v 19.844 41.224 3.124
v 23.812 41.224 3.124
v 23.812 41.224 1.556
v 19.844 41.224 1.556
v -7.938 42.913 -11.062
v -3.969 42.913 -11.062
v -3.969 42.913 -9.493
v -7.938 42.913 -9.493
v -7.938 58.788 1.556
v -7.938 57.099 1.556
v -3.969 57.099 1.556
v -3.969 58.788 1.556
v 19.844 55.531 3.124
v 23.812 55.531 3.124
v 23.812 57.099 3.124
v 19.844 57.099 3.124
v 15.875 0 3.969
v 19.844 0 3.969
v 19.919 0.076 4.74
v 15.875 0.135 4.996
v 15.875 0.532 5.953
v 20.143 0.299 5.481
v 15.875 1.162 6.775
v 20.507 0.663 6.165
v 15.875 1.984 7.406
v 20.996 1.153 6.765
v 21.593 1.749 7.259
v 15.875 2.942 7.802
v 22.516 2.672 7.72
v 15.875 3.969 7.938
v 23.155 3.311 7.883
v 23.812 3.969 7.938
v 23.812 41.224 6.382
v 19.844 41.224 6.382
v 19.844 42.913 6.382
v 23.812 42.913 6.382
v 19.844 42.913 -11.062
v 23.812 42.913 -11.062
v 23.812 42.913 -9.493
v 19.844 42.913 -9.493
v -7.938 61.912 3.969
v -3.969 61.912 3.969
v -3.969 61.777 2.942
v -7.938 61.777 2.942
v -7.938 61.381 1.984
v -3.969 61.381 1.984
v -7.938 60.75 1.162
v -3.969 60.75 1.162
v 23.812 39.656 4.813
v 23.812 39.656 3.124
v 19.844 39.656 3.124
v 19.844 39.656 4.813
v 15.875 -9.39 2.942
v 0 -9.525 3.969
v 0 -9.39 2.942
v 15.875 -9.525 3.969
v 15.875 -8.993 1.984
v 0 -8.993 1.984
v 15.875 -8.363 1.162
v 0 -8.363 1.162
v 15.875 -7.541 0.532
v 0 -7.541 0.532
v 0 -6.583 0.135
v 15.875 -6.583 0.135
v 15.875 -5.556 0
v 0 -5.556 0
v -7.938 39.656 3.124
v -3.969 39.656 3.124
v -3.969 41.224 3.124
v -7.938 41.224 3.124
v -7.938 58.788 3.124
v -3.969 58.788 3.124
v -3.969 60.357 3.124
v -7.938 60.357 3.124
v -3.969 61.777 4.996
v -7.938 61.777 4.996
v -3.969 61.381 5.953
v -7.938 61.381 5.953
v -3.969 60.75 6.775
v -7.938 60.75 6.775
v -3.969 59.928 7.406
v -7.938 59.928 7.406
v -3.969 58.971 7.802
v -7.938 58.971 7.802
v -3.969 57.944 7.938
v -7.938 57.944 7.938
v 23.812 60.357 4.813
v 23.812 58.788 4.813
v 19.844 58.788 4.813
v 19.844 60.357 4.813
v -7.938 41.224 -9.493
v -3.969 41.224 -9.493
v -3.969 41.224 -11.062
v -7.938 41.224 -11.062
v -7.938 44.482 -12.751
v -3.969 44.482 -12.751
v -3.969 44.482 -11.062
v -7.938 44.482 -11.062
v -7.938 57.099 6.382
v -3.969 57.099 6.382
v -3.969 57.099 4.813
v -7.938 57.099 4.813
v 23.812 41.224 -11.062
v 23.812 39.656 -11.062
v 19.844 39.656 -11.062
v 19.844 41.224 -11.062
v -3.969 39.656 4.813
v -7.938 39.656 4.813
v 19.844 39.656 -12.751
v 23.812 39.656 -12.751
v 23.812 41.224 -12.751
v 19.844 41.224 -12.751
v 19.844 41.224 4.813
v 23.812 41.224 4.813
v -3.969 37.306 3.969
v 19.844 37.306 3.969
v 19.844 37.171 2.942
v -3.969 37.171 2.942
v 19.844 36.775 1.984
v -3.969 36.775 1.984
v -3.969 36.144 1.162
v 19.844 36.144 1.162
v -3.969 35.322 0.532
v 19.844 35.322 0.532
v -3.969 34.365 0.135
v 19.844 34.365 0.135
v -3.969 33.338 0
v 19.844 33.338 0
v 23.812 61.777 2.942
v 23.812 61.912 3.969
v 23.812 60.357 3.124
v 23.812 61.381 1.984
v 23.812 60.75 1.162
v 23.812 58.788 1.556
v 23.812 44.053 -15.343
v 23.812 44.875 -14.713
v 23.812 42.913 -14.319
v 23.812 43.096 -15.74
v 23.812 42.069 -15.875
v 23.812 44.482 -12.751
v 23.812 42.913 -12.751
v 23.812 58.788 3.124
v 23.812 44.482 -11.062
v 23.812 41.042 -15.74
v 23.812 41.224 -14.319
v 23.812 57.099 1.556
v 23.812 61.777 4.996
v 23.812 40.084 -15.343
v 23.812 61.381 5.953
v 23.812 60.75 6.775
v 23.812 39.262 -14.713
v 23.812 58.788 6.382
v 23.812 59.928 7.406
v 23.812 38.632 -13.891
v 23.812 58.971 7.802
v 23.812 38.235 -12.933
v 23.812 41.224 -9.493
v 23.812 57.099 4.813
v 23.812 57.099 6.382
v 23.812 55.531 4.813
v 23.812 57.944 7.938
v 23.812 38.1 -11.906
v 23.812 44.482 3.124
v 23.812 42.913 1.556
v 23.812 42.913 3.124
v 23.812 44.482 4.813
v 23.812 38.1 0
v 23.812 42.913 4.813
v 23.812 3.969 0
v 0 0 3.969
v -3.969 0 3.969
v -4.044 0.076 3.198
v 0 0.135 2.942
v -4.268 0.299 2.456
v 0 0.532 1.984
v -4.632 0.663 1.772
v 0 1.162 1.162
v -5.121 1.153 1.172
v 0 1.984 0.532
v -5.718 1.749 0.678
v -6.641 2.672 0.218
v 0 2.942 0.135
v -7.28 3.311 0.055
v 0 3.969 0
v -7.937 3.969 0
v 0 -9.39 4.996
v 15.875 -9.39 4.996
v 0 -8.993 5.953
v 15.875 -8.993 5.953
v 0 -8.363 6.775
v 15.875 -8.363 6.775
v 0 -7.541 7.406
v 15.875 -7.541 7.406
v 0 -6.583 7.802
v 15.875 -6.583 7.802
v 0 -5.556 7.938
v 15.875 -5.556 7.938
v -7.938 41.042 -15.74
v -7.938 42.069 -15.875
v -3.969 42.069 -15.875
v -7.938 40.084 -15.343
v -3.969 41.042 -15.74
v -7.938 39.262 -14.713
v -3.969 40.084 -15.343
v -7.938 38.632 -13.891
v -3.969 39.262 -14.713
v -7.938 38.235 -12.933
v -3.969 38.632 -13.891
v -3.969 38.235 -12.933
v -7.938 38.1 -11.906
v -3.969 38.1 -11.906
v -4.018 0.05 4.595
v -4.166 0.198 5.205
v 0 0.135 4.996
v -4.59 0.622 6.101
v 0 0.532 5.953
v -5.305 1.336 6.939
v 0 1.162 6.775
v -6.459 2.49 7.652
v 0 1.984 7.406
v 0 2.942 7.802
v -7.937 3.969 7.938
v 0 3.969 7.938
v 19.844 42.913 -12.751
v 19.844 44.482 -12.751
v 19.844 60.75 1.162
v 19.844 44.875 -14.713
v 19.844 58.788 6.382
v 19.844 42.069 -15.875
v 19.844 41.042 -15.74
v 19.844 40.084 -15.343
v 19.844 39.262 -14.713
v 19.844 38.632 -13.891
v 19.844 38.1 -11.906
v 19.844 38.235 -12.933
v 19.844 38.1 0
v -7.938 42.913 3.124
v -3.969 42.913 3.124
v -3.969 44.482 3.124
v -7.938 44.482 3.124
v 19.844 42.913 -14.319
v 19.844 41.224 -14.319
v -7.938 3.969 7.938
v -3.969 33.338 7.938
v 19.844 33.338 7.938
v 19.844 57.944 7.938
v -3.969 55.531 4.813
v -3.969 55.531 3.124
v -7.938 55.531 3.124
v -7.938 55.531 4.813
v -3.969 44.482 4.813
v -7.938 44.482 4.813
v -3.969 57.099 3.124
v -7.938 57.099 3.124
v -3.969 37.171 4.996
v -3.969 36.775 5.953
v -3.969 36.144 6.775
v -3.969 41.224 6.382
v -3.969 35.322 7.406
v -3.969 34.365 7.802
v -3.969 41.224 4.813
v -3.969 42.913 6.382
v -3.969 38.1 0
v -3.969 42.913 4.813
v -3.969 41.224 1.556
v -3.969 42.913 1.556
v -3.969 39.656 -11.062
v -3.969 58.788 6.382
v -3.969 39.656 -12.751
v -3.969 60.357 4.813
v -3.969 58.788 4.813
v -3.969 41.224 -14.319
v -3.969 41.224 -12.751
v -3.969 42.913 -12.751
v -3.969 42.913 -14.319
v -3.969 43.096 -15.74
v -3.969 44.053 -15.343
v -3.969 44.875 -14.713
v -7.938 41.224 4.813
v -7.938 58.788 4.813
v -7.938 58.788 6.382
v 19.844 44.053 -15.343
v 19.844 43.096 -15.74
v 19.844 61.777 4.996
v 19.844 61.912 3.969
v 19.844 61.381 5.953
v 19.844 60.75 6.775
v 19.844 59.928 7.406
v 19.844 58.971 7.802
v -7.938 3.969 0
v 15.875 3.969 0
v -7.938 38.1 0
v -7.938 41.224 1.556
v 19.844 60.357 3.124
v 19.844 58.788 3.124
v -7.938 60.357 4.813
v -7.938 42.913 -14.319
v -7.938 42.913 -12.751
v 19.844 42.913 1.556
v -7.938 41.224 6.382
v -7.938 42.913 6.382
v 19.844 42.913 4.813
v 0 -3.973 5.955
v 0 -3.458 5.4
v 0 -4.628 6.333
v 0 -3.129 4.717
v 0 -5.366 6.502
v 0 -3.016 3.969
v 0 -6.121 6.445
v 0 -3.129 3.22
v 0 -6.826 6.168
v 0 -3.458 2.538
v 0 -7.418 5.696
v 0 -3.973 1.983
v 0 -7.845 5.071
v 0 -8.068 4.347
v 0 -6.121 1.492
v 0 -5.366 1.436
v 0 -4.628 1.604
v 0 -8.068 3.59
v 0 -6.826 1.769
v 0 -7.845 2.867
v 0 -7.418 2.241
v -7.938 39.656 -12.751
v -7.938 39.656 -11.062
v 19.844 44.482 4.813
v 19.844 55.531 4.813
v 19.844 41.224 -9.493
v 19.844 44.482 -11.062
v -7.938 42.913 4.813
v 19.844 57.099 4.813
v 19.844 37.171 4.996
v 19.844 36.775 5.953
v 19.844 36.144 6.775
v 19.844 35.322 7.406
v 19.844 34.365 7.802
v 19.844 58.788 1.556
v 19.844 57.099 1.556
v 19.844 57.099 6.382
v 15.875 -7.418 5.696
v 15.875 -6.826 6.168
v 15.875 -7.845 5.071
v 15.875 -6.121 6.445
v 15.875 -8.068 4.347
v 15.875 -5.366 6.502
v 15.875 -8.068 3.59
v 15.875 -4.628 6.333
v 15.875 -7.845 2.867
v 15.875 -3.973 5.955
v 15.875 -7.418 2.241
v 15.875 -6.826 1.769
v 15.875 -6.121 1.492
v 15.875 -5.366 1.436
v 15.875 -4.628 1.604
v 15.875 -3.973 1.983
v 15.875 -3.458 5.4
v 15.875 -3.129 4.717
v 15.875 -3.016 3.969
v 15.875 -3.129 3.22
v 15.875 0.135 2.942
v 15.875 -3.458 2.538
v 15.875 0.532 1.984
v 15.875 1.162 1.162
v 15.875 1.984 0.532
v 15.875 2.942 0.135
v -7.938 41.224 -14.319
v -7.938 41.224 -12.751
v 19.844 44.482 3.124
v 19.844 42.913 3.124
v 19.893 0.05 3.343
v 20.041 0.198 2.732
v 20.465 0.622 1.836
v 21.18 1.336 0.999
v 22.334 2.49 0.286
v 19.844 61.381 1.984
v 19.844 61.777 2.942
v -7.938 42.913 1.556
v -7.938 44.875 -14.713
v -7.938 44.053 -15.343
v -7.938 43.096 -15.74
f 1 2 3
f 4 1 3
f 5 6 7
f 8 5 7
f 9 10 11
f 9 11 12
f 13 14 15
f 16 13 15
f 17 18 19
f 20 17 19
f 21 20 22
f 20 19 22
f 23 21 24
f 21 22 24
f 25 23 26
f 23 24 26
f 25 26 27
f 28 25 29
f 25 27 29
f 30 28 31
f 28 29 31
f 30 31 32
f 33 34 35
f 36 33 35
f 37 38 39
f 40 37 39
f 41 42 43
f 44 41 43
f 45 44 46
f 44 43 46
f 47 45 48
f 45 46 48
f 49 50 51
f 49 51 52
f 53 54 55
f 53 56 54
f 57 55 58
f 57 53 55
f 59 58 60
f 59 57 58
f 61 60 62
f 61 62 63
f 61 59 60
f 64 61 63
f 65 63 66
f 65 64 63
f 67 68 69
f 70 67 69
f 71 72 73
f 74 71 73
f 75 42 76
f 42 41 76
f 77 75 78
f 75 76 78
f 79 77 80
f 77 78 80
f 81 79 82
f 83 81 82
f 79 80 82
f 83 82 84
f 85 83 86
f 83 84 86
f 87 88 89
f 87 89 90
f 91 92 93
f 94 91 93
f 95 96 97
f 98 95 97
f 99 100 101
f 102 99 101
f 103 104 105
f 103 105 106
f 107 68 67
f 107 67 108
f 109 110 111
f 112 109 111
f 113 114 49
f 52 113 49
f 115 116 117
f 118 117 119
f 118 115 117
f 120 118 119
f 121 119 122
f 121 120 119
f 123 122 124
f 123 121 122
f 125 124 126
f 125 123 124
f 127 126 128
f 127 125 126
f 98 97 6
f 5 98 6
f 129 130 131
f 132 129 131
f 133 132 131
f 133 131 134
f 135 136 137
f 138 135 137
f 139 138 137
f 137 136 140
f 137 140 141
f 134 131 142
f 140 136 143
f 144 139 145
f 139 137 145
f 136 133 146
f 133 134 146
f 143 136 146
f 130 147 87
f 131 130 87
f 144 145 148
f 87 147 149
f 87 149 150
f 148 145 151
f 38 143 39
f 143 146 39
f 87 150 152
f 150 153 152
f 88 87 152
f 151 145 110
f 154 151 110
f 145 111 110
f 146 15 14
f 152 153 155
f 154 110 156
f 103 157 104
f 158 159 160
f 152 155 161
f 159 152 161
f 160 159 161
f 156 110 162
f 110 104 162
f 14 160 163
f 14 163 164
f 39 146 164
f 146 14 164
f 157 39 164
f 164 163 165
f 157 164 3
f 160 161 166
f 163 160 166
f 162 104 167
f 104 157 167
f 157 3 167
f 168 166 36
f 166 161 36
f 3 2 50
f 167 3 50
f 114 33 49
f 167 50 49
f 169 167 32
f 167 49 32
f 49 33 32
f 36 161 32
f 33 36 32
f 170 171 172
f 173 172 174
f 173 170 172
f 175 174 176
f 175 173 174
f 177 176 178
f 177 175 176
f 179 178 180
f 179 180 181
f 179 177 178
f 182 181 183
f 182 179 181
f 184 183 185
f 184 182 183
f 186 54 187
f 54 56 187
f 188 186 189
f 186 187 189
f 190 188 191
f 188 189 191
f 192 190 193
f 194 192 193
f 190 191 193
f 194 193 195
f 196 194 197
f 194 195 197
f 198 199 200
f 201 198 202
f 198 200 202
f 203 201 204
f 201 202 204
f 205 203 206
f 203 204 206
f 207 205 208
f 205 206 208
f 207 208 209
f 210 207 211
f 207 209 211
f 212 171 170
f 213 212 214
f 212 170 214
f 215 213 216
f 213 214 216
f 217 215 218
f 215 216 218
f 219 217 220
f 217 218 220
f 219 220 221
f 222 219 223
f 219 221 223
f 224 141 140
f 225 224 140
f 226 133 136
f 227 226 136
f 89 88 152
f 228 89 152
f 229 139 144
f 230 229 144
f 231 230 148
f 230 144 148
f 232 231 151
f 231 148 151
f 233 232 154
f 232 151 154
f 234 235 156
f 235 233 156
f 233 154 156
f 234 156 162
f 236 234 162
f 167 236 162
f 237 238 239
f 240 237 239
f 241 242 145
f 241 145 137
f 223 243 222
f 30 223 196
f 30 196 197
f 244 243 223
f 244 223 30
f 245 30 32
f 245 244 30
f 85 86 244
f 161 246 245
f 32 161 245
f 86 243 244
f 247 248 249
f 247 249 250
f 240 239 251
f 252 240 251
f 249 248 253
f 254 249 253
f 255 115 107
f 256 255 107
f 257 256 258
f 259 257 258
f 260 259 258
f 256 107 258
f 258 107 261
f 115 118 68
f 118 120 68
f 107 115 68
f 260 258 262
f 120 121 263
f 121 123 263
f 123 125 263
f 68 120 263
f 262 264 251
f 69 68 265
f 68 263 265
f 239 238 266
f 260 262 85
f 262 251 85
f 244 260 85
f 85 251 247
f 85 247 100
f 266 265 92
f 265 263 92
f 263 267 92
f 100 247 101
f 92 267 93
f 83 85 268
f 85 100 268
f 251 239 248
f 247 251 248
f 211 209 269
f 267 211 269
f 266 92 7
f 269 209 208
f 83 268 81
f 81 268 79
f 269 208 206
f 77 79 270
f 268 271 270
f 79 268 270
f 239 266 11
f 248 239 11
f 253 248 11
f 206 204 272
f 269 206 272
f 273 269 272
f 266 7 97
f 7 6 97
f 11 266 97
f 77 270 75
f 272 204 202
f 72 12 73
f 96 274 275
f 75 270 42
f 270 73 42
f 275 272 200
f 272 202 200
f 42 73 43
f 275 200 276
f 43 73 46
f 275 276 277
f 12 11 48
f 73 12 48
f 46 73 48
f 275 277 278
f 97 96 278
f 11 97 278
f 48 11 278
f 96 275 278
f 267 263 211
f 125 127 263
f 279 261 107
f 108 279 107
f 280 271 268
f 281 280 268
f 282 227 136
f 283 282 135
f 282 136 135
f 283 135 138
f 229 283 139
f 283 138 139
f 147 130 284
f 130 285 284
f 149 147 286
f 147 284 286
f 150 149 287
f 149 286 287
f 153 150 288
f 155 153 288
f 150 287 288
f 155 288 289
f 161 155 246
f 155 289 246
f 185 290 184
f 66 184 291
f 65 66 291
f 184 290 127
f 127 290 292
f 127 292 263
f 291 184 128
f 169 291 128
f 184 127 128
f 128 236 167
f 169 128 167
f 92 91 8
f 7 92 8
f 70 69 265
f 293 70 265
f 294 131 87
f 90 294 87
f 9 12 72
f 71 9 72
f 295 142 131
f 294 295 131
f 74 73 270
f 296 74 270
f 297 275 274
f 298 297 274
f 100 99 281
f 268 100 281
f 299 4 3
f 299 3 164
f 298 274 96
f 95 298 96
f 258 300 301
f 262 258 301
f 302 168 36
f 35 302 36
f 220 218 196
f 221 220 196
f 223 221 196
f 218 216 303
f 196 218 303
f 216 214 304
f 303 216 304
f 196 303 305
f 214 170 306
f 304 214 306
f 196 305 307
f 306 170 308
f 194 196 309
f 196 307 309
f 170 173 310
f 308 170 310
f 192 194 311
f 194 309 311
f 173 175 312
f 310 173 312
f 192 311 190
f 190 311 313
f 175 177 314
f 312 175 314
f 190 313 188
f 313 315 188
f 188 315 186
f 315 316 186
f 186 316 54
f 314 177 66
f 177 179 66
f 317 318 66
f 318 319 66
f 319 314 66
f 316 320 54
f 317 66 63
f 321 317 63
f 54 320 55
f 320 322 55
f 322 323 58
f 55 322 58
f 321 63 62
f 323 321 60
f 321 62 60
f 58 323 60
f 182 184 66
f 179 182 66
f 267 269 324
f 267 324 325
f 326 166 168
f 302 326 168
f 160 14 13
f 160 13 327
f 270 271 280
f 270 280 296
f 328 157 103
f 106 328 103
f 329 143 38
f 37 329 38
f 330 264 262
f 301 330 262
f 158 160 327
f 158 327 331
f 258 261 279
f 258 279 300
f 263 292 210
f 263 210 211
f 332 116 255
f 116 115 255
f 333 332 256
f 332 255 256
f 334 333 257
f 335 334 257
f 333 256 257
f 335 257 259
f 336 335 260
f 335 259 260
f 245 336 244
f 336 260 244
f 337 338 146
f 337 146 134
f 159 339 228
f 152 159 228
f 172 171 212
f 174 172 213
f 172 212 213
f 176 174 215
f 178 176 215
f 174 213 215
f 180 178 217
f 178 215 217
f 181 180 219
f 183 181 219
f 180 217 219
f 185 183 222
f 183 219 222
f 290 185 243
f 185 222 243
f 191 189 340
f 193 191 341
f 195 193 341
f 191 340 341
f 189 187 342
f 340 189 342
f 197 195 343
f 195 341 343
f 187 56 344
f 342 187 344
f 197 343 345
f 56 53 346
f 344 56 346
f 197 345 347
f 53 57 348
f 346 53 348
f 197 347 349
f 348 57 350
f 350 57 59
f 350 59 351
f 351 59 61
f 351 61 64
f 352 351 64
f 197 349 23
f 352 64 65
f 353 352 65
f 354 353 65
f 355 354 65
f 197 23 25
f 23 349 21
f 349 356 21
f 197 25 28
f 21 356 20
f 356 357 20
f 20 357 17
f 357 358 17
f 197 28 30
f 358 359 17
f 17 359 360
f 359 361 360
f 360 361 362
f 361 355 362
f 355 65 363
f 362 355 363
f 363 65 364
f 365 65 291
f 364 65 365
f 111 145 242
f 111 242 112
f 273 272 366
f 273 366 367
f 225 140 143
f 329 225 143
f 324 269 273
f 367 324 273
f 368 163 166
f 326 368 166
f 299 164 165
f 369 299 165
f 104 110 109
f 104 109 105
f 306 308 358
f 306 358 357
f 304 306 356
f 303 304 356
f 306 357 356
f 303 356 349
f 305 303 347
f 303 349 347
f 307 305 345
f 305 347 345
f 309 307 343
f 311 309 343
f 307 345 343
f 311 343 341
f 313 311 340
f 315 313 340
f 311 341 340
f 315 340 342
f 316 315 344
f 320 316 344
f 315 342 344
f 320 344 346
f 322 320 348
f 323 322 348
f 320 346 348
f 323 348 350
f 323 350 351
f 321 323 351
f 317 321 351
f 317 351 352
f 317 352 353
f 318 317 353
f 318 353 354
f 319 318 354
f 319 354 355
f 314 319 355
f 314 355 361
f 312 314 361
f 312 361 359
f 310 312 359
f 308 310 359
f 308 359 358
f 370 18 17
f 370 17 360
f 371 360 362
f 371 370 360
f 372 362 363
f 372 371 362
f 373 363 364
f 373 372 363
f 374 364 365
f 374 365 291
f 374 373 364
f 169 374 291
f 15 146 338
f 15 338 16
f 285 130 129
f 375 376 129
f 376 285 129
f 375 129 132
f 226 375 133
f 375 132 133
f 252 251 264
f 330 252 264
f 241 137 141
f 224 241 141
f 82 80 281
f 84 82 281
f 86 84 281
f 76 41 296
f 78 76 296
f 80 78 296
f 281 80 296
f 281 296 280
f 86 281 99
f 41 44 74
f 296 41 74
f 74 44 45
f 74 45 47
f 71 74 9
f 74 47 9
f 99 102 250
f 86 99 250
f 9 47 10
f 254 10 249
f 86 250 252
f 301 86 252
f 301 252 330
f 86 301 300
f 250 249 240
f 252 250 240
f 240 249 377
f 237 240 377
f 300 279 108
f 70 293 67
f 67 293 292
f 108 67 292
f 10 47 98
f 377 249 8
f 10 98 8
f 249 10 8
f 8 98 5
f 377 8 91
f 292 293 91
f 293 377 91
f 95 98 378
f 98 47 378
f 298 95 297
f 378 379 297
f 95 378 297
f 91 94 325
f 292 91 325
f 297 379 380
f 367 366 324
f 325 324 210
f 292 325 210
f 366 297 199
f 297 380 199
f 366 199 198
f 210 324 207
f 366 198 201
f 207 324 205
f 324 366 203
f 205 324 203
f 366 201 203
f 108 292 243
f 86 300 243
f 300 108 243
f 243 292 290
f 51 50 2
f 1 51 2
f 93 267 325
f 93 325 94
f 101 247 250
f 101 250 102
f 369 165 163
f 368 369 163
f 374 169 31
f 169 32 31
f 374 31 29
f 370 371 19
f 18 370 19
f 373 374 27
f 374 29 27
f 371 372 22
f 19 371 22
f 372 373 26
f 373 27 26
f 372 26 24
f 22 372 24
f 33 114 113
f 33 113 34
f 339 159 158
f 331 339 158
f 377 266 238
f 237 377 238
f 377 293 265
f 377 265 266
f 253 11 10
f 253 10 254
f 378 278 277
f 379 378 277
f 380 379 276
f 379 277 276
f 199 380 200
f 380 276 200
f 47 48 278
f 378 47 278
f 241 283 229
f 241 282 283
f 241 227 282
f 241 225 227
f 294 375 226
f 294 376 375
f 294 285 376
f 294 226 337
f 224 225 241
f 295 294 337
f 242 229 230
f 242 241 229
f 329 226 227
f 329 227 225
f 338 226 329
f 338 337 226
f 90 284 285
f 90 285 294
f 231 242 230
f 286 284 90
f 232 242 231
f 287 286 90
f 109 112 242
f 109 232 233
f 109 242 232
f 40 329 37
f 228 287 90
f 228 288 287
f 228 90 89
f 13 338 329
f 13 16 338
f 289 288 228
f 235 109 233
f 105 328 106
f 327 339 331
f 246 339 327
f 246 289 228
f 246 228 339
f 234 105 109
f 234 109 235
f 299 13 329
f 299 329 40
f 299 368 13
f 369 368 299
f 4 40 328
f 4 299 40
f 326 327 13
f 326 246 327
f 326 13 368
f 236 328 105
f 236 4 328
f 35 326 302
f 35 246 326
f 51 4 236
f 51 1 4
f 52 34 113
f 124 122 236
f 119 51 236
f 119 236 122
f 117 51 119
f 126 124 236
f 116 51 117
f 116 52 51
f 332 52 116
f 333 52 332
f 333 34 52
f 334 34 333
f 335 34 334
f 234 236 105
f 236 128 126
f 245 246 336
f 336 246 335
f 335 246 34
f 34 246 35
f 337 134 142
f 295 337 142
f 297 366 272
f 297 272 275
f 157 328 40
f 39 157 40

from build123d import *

# Parameters (mm, degrees)
F1_DEPTH = 7.9375
F2_R     = 3.96874
F3_W     = 3.96875
F3_H     = 23.8125
F4_DEPTH = 15.875
F5_W     = 1.56845
F5_H     = 1.6891
F5_W_2   = 1.6891
F5_H_2   = 1.56845
F5_R     = 2.54
F6_DEPTH = 31.75
F8_DEPTH = 7.9375


# Not quite as in the source:
# - a fillet or chamfer is up to 0.001 mm smaller than in the source, because OpenCascade refuses the exact size


with BuildPart() as f1:
    # F0 (on Top) → F1 (new body)
    with BuildSketch(Plane.XY):
        Polygon((0, 0), (0, -9.525), (15.875, -9.525), (15.875, 0), (23.8125, 0), (23.8125, 61.9125), (19.84375, 61.9125), (19.84375, 37.30625), (-3.96875, 37.30625), (-3.96875, 61.9125), (-7.9375, 61.9125), (-7.9375, 0), align=None)
    extrude(amount=F1_DEPTH)

    # F2 (radius 3.96875 in the source; OpenCascade refuses exactly that, so slightly less here)
    f2_edges = [f1.edges().sort_by_distance(p)[0] for p in [
        (19.84375, 0, 7.9375),
        (19.84375, 0, 0),
        (7.9375, -9.525, 0),
        (7.9375, -9.525, 7.9375),
        (-3.96875, 0, 7.9375),
        (-3.96875, 0, 0),
        (-5.953125, 61.9125, 7.9375),
        (7.9375, 37.30625, 0),
        (7.9375, 37.30625, 7.9375),
        (21.828125, 61.9125, 7.9375),
    ]]
    fillet(f2_edges, radius=F2_R)

    # F3 (on face) → F4 (join)
    with BuildSketch(Plane(origin=(0, 0, 0), x_dir=(1, 0, 0), z_dir=(0, 0, -1))):
        with Locations((21.828125, -50.00625)):
            Rectangle(F3_W, F3_H)
        with Locations((-5.953125, -50.00625)):
            Rectangle(F3_W, F3_H)
    extrude(amount=F4_DEPTH)

    # F5 (on face) → F6 (cut, through all)
    with BuildSketch(Plane.YZ.offset(23.8125)):
        with BuildLine():
            Line((38.1, -15.875), (42.06875, -15.875))
            ThreePointArc((42.06875, -15.875), (39.2624199622, -14.7125800378), (38.1, -11.90625))
            Line((38.1, -11.90625), (38.1, -15.875))
        make_face()
        with BuildLine():
            Line((42.06875, -15.875), (61.9125, -15.875))
            Line((61.9125, -15.875), (61.9125, 3.96875))
            ThreePointArc((61.9125, 3.96875), (61.6103968947, 2.4499751278), (60.7500800378, 1.1624199622))
            Line((60.7500800378, 1.1624199622), (44.8750800378, -14.7125800378))
            ThreePointArc((44.8750800378, -14.7125800378), (43.5875248722, -15.5728968947), (42.06875, -15.875))
        make_face()
        with Locations((43.697525, -11.90625)):
            Rectangle(F5_W, F5_H)
        with Locations((42.06875, -11.90625)):
            Rectangle(F5_W_2, F5_H)
        with Locations((42.06875, -10.277475)):
            Rectangle(F5_W_2, F5_H_2)
        with Locations((40.439975, -11.90625)):
            Rectangle(F5_W, F5_H)
        with Locations((42.06875, -13.535025)):
            Rectangle(F5_W_2, F5_H_2)
        with Locations((57.94375, 5.597525)):
            Rectangle(F5_W_2, F5_H_2)
        with Locations((57.94375, 3.96875)):
            Rectangle(F5_W_2, F5_H)
        with Locations((56.314975, 3.96875)):
            Rectangle(F5_W, F5_H)
        with Locations((59.572525, 3.96875)):
            Rectangle(F5_W, F5_H)
        with Locations((57.94375, 2.339975)):
            Rectangle(F5_W_2, F5_H_2)
        with Locations((42.06875, 2.339975)):
            Rectangle(F5_W_2, F5_H_2)
        with Locations((42.06875, 3.96875)):
            Rectangle(F5_W_2, F5_H)
        with Locations((43.697525, 3.96875)):
            Rectangle(F5_W, F5_H)
        with Locations((40.439975, 3.96875)):
            Rectangle(F5_W, F5_H)
        with Locations((42.06875, 5.597525)):
            Rectangle(F5_W_2, F5_H_2)
        with Locations((-5.55625, 3.96875)):
            Circle(F5_R)
    extrude(amount=-F6_DEPTH, mode=Mode.SUBTRACT)

    # F7 (on face) → F8 (cut, through all)
    with BuildSketch(Plane.XY.offset(7.9375)):
        Polygon((19.84375, 0), (23.8125, 0), (23.8125, 3.96875), align=None)
        Polygon((-7.9375, 3.96875), (-7.9375, 0), (-3.96875, 0), align=None)
    extrude(amount=-F8_DEPTH, mode=Mode.SUBTRACT)


solid = f1.part
